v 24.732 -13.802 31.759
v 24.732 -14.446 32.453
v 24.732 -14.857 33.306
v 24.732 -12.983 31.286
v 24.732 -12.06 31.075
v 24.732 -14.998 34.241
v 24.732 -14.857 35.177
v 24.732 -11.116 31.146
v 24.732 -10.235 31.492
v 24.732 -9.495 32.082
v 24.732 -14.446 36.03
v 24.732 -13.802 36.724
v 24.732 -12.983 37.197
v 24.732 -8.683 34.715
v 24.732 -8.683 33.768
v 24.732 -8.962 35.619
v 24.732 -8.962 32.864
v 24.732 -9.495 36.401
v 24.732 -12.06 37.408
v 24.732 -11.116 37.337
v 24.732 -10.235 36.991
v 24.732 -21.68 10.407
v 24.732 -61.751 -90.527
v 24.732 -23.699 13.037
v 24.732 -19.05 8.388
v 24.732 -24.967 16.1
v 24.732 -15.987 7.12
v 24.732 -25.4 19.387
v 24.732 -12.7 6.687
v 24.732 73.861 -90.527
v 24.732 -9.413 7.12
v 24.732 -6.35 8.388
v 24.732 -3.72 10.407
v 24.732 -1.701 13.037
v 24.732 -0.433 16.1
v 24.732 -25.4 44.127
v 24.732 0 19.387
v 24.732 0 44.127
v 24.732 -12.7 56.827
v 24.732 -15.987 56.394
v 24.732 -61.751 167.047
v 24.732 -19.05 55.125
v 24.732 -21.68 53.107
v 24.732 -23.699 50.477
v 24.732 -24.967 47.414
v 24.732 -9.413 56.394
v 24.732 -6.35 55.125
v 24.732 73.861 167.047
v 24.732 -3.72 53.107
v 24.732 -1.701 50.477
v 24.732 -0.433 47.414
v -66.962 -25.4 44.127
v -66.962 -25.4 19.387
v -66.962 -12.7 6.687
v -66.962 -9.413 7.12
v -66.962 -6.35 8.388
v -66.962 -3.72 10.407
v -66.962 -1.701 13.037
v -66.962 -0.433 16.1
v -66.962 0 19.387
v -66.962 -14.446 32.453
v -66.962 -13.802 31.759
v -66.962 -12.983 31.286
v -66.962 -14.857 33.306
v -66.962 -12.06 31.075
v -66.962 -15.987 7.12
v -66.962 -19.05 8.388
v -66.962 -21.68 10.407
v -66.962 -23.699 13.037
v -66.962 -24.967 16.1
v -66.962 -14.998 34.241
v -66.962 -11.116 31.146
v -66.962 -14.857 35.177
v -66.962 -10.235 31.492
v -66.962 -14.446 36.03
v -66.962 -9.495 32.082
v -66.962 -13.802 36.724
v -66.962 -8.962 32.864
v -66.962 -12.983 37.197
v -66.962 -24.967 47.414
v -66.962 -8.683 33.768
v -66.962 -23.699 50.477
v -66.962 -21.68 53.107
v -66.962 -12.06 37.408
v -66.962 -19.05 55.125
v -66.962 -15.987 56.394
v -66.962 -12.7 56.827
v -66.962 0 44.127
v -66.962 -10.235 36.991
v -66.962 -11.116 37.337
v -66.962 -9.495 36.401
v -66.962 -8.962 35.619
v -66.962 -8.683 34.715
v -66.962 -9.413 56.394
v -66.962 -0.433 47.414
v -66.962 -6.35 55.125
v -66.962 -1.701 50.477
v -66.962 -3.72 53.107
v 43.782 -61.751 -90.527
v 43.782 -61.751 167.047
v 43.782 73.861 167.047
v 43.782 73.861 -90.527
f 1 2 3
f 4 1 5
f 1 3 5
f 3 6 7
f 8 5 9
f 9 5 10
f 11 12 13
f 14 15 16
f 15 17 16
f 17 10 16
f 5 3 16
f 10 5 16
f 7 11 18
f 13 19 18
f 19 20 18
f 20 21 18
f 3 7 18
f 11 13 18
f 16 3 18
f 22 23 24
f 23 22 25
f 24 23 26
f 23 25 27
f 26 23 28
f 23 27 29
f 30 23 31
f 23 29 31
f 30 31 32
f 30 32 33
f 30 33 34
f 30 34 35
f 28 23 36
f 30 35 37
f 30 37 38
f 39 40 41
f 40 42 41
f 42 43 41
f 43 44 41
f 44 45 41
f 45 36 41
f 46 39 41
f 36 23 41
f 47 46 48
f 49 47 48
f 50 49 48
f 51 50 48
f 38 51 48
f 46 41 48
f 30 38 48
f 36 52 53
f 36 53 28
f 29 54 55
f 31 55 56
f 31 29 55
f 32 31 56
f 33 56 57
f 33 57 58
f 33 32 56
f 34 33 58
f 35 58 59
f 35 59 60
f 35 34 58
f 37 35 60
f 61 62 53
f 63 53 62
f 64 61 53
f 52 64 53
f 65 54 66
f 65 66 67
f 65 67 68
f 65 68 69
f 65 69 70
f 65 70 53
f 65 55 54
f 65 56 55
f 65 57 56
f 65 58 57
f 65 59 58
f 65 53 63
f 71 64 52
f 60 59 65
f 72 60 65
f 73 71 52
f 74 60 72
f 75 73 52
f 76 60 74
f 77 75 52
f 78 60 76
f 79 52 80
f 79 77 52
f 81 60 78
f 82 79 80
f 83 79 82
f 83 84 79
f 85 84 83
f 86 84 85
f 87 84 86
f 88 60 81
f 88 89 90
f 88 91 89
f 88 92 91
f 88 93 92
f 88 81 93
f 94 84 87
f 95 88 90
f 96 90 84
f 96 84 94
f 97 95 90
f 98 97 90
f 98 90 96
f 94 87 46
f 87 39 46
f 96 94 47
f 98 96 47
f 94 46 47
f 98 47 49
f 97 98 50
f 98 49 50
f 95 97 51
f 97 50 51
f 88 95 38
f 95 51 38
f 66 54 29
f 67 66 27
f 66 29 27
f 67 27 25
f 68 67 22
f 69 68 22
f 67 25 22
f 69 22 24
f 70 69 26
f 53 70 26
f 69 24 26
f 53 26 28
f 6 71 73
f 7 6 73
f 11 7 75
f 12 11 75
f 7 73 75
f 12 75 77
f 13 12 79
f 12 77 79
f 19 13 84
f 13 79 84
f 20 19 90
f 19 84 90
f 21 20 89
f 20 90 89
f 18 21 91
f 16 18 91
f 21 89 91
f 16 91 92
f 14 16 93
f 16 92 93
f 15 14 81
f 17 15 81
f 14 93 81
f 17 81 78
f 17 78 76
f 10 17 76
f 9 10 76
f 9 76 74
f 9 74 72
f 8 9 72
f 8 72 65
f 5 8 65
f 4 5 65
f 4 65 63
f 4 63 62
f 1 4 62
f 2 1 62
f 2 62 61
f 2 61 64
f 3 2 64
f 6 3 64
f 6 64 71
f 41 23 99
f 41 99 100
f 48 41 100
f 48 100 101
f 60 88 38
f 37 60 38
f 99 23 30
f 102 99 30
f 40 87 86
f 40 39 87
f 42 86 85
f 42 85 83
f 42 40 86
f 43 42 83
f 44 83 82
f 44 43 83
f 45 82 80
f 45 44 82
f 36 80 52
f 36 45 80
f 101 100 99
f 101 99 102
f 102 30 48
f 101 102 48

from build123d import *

# Parameters (mm, degrees)
F0_W     = 91.694
F0_H     = 50.1397587359
F1_DEPTH = 25.4
F2_R     = 12.69999
F4_D     = 6.35
F5_W     = 135.6123574078
F5_H     = 257.5739622116
F6_DEPTH = 19.05


# Not quite as in the source:
# - a fillet or chamfer is up to 0.001 mm smaller than in the source, because OpenCascade refuses the exact size


with BuildPart() as f1:
    # F0 (on Front) → F1 (new body)
    with BuildSketch(Plane.XZ):
        with Locations((-21.1153341503, 31.7568909377)):
            Rectangle(F0_W, F0_H)
    extrude(amount=F1_DEPTH)

    # F2 (radius 12.7 in the source; OpenCascade refuses exactly that, so slightly less here)
    f2_edges = [f1.edges().sort_by_distance(p)[0] for p in [
        (-21.115334, -25.4, 56.82677),
        (-21.115334, -25.4, 6.687012),
        (-21.115334, 0, 56.82677),
        (-21.115334, 0, 6.687012),
    ]]
    fillet(f2_edges, radius=F2_R)

    # F4 (through all)
    with Locations(Plane.YZ.offset(24.7316658497)):
        with Locations((-11.8228401989, 34.2414677143)):
            Hole(F4_D / 2)

    # F5 (on face) → F6 (join)
    with BuildSketch(Plane.YZ.offset(24.7316658497)):
        with Locations((6.0548242182, 38.2600277662)):
            Rectangle(F5_W, F5_H)
    extrude(amount=F6_DEPTH)


solid = f1.part
